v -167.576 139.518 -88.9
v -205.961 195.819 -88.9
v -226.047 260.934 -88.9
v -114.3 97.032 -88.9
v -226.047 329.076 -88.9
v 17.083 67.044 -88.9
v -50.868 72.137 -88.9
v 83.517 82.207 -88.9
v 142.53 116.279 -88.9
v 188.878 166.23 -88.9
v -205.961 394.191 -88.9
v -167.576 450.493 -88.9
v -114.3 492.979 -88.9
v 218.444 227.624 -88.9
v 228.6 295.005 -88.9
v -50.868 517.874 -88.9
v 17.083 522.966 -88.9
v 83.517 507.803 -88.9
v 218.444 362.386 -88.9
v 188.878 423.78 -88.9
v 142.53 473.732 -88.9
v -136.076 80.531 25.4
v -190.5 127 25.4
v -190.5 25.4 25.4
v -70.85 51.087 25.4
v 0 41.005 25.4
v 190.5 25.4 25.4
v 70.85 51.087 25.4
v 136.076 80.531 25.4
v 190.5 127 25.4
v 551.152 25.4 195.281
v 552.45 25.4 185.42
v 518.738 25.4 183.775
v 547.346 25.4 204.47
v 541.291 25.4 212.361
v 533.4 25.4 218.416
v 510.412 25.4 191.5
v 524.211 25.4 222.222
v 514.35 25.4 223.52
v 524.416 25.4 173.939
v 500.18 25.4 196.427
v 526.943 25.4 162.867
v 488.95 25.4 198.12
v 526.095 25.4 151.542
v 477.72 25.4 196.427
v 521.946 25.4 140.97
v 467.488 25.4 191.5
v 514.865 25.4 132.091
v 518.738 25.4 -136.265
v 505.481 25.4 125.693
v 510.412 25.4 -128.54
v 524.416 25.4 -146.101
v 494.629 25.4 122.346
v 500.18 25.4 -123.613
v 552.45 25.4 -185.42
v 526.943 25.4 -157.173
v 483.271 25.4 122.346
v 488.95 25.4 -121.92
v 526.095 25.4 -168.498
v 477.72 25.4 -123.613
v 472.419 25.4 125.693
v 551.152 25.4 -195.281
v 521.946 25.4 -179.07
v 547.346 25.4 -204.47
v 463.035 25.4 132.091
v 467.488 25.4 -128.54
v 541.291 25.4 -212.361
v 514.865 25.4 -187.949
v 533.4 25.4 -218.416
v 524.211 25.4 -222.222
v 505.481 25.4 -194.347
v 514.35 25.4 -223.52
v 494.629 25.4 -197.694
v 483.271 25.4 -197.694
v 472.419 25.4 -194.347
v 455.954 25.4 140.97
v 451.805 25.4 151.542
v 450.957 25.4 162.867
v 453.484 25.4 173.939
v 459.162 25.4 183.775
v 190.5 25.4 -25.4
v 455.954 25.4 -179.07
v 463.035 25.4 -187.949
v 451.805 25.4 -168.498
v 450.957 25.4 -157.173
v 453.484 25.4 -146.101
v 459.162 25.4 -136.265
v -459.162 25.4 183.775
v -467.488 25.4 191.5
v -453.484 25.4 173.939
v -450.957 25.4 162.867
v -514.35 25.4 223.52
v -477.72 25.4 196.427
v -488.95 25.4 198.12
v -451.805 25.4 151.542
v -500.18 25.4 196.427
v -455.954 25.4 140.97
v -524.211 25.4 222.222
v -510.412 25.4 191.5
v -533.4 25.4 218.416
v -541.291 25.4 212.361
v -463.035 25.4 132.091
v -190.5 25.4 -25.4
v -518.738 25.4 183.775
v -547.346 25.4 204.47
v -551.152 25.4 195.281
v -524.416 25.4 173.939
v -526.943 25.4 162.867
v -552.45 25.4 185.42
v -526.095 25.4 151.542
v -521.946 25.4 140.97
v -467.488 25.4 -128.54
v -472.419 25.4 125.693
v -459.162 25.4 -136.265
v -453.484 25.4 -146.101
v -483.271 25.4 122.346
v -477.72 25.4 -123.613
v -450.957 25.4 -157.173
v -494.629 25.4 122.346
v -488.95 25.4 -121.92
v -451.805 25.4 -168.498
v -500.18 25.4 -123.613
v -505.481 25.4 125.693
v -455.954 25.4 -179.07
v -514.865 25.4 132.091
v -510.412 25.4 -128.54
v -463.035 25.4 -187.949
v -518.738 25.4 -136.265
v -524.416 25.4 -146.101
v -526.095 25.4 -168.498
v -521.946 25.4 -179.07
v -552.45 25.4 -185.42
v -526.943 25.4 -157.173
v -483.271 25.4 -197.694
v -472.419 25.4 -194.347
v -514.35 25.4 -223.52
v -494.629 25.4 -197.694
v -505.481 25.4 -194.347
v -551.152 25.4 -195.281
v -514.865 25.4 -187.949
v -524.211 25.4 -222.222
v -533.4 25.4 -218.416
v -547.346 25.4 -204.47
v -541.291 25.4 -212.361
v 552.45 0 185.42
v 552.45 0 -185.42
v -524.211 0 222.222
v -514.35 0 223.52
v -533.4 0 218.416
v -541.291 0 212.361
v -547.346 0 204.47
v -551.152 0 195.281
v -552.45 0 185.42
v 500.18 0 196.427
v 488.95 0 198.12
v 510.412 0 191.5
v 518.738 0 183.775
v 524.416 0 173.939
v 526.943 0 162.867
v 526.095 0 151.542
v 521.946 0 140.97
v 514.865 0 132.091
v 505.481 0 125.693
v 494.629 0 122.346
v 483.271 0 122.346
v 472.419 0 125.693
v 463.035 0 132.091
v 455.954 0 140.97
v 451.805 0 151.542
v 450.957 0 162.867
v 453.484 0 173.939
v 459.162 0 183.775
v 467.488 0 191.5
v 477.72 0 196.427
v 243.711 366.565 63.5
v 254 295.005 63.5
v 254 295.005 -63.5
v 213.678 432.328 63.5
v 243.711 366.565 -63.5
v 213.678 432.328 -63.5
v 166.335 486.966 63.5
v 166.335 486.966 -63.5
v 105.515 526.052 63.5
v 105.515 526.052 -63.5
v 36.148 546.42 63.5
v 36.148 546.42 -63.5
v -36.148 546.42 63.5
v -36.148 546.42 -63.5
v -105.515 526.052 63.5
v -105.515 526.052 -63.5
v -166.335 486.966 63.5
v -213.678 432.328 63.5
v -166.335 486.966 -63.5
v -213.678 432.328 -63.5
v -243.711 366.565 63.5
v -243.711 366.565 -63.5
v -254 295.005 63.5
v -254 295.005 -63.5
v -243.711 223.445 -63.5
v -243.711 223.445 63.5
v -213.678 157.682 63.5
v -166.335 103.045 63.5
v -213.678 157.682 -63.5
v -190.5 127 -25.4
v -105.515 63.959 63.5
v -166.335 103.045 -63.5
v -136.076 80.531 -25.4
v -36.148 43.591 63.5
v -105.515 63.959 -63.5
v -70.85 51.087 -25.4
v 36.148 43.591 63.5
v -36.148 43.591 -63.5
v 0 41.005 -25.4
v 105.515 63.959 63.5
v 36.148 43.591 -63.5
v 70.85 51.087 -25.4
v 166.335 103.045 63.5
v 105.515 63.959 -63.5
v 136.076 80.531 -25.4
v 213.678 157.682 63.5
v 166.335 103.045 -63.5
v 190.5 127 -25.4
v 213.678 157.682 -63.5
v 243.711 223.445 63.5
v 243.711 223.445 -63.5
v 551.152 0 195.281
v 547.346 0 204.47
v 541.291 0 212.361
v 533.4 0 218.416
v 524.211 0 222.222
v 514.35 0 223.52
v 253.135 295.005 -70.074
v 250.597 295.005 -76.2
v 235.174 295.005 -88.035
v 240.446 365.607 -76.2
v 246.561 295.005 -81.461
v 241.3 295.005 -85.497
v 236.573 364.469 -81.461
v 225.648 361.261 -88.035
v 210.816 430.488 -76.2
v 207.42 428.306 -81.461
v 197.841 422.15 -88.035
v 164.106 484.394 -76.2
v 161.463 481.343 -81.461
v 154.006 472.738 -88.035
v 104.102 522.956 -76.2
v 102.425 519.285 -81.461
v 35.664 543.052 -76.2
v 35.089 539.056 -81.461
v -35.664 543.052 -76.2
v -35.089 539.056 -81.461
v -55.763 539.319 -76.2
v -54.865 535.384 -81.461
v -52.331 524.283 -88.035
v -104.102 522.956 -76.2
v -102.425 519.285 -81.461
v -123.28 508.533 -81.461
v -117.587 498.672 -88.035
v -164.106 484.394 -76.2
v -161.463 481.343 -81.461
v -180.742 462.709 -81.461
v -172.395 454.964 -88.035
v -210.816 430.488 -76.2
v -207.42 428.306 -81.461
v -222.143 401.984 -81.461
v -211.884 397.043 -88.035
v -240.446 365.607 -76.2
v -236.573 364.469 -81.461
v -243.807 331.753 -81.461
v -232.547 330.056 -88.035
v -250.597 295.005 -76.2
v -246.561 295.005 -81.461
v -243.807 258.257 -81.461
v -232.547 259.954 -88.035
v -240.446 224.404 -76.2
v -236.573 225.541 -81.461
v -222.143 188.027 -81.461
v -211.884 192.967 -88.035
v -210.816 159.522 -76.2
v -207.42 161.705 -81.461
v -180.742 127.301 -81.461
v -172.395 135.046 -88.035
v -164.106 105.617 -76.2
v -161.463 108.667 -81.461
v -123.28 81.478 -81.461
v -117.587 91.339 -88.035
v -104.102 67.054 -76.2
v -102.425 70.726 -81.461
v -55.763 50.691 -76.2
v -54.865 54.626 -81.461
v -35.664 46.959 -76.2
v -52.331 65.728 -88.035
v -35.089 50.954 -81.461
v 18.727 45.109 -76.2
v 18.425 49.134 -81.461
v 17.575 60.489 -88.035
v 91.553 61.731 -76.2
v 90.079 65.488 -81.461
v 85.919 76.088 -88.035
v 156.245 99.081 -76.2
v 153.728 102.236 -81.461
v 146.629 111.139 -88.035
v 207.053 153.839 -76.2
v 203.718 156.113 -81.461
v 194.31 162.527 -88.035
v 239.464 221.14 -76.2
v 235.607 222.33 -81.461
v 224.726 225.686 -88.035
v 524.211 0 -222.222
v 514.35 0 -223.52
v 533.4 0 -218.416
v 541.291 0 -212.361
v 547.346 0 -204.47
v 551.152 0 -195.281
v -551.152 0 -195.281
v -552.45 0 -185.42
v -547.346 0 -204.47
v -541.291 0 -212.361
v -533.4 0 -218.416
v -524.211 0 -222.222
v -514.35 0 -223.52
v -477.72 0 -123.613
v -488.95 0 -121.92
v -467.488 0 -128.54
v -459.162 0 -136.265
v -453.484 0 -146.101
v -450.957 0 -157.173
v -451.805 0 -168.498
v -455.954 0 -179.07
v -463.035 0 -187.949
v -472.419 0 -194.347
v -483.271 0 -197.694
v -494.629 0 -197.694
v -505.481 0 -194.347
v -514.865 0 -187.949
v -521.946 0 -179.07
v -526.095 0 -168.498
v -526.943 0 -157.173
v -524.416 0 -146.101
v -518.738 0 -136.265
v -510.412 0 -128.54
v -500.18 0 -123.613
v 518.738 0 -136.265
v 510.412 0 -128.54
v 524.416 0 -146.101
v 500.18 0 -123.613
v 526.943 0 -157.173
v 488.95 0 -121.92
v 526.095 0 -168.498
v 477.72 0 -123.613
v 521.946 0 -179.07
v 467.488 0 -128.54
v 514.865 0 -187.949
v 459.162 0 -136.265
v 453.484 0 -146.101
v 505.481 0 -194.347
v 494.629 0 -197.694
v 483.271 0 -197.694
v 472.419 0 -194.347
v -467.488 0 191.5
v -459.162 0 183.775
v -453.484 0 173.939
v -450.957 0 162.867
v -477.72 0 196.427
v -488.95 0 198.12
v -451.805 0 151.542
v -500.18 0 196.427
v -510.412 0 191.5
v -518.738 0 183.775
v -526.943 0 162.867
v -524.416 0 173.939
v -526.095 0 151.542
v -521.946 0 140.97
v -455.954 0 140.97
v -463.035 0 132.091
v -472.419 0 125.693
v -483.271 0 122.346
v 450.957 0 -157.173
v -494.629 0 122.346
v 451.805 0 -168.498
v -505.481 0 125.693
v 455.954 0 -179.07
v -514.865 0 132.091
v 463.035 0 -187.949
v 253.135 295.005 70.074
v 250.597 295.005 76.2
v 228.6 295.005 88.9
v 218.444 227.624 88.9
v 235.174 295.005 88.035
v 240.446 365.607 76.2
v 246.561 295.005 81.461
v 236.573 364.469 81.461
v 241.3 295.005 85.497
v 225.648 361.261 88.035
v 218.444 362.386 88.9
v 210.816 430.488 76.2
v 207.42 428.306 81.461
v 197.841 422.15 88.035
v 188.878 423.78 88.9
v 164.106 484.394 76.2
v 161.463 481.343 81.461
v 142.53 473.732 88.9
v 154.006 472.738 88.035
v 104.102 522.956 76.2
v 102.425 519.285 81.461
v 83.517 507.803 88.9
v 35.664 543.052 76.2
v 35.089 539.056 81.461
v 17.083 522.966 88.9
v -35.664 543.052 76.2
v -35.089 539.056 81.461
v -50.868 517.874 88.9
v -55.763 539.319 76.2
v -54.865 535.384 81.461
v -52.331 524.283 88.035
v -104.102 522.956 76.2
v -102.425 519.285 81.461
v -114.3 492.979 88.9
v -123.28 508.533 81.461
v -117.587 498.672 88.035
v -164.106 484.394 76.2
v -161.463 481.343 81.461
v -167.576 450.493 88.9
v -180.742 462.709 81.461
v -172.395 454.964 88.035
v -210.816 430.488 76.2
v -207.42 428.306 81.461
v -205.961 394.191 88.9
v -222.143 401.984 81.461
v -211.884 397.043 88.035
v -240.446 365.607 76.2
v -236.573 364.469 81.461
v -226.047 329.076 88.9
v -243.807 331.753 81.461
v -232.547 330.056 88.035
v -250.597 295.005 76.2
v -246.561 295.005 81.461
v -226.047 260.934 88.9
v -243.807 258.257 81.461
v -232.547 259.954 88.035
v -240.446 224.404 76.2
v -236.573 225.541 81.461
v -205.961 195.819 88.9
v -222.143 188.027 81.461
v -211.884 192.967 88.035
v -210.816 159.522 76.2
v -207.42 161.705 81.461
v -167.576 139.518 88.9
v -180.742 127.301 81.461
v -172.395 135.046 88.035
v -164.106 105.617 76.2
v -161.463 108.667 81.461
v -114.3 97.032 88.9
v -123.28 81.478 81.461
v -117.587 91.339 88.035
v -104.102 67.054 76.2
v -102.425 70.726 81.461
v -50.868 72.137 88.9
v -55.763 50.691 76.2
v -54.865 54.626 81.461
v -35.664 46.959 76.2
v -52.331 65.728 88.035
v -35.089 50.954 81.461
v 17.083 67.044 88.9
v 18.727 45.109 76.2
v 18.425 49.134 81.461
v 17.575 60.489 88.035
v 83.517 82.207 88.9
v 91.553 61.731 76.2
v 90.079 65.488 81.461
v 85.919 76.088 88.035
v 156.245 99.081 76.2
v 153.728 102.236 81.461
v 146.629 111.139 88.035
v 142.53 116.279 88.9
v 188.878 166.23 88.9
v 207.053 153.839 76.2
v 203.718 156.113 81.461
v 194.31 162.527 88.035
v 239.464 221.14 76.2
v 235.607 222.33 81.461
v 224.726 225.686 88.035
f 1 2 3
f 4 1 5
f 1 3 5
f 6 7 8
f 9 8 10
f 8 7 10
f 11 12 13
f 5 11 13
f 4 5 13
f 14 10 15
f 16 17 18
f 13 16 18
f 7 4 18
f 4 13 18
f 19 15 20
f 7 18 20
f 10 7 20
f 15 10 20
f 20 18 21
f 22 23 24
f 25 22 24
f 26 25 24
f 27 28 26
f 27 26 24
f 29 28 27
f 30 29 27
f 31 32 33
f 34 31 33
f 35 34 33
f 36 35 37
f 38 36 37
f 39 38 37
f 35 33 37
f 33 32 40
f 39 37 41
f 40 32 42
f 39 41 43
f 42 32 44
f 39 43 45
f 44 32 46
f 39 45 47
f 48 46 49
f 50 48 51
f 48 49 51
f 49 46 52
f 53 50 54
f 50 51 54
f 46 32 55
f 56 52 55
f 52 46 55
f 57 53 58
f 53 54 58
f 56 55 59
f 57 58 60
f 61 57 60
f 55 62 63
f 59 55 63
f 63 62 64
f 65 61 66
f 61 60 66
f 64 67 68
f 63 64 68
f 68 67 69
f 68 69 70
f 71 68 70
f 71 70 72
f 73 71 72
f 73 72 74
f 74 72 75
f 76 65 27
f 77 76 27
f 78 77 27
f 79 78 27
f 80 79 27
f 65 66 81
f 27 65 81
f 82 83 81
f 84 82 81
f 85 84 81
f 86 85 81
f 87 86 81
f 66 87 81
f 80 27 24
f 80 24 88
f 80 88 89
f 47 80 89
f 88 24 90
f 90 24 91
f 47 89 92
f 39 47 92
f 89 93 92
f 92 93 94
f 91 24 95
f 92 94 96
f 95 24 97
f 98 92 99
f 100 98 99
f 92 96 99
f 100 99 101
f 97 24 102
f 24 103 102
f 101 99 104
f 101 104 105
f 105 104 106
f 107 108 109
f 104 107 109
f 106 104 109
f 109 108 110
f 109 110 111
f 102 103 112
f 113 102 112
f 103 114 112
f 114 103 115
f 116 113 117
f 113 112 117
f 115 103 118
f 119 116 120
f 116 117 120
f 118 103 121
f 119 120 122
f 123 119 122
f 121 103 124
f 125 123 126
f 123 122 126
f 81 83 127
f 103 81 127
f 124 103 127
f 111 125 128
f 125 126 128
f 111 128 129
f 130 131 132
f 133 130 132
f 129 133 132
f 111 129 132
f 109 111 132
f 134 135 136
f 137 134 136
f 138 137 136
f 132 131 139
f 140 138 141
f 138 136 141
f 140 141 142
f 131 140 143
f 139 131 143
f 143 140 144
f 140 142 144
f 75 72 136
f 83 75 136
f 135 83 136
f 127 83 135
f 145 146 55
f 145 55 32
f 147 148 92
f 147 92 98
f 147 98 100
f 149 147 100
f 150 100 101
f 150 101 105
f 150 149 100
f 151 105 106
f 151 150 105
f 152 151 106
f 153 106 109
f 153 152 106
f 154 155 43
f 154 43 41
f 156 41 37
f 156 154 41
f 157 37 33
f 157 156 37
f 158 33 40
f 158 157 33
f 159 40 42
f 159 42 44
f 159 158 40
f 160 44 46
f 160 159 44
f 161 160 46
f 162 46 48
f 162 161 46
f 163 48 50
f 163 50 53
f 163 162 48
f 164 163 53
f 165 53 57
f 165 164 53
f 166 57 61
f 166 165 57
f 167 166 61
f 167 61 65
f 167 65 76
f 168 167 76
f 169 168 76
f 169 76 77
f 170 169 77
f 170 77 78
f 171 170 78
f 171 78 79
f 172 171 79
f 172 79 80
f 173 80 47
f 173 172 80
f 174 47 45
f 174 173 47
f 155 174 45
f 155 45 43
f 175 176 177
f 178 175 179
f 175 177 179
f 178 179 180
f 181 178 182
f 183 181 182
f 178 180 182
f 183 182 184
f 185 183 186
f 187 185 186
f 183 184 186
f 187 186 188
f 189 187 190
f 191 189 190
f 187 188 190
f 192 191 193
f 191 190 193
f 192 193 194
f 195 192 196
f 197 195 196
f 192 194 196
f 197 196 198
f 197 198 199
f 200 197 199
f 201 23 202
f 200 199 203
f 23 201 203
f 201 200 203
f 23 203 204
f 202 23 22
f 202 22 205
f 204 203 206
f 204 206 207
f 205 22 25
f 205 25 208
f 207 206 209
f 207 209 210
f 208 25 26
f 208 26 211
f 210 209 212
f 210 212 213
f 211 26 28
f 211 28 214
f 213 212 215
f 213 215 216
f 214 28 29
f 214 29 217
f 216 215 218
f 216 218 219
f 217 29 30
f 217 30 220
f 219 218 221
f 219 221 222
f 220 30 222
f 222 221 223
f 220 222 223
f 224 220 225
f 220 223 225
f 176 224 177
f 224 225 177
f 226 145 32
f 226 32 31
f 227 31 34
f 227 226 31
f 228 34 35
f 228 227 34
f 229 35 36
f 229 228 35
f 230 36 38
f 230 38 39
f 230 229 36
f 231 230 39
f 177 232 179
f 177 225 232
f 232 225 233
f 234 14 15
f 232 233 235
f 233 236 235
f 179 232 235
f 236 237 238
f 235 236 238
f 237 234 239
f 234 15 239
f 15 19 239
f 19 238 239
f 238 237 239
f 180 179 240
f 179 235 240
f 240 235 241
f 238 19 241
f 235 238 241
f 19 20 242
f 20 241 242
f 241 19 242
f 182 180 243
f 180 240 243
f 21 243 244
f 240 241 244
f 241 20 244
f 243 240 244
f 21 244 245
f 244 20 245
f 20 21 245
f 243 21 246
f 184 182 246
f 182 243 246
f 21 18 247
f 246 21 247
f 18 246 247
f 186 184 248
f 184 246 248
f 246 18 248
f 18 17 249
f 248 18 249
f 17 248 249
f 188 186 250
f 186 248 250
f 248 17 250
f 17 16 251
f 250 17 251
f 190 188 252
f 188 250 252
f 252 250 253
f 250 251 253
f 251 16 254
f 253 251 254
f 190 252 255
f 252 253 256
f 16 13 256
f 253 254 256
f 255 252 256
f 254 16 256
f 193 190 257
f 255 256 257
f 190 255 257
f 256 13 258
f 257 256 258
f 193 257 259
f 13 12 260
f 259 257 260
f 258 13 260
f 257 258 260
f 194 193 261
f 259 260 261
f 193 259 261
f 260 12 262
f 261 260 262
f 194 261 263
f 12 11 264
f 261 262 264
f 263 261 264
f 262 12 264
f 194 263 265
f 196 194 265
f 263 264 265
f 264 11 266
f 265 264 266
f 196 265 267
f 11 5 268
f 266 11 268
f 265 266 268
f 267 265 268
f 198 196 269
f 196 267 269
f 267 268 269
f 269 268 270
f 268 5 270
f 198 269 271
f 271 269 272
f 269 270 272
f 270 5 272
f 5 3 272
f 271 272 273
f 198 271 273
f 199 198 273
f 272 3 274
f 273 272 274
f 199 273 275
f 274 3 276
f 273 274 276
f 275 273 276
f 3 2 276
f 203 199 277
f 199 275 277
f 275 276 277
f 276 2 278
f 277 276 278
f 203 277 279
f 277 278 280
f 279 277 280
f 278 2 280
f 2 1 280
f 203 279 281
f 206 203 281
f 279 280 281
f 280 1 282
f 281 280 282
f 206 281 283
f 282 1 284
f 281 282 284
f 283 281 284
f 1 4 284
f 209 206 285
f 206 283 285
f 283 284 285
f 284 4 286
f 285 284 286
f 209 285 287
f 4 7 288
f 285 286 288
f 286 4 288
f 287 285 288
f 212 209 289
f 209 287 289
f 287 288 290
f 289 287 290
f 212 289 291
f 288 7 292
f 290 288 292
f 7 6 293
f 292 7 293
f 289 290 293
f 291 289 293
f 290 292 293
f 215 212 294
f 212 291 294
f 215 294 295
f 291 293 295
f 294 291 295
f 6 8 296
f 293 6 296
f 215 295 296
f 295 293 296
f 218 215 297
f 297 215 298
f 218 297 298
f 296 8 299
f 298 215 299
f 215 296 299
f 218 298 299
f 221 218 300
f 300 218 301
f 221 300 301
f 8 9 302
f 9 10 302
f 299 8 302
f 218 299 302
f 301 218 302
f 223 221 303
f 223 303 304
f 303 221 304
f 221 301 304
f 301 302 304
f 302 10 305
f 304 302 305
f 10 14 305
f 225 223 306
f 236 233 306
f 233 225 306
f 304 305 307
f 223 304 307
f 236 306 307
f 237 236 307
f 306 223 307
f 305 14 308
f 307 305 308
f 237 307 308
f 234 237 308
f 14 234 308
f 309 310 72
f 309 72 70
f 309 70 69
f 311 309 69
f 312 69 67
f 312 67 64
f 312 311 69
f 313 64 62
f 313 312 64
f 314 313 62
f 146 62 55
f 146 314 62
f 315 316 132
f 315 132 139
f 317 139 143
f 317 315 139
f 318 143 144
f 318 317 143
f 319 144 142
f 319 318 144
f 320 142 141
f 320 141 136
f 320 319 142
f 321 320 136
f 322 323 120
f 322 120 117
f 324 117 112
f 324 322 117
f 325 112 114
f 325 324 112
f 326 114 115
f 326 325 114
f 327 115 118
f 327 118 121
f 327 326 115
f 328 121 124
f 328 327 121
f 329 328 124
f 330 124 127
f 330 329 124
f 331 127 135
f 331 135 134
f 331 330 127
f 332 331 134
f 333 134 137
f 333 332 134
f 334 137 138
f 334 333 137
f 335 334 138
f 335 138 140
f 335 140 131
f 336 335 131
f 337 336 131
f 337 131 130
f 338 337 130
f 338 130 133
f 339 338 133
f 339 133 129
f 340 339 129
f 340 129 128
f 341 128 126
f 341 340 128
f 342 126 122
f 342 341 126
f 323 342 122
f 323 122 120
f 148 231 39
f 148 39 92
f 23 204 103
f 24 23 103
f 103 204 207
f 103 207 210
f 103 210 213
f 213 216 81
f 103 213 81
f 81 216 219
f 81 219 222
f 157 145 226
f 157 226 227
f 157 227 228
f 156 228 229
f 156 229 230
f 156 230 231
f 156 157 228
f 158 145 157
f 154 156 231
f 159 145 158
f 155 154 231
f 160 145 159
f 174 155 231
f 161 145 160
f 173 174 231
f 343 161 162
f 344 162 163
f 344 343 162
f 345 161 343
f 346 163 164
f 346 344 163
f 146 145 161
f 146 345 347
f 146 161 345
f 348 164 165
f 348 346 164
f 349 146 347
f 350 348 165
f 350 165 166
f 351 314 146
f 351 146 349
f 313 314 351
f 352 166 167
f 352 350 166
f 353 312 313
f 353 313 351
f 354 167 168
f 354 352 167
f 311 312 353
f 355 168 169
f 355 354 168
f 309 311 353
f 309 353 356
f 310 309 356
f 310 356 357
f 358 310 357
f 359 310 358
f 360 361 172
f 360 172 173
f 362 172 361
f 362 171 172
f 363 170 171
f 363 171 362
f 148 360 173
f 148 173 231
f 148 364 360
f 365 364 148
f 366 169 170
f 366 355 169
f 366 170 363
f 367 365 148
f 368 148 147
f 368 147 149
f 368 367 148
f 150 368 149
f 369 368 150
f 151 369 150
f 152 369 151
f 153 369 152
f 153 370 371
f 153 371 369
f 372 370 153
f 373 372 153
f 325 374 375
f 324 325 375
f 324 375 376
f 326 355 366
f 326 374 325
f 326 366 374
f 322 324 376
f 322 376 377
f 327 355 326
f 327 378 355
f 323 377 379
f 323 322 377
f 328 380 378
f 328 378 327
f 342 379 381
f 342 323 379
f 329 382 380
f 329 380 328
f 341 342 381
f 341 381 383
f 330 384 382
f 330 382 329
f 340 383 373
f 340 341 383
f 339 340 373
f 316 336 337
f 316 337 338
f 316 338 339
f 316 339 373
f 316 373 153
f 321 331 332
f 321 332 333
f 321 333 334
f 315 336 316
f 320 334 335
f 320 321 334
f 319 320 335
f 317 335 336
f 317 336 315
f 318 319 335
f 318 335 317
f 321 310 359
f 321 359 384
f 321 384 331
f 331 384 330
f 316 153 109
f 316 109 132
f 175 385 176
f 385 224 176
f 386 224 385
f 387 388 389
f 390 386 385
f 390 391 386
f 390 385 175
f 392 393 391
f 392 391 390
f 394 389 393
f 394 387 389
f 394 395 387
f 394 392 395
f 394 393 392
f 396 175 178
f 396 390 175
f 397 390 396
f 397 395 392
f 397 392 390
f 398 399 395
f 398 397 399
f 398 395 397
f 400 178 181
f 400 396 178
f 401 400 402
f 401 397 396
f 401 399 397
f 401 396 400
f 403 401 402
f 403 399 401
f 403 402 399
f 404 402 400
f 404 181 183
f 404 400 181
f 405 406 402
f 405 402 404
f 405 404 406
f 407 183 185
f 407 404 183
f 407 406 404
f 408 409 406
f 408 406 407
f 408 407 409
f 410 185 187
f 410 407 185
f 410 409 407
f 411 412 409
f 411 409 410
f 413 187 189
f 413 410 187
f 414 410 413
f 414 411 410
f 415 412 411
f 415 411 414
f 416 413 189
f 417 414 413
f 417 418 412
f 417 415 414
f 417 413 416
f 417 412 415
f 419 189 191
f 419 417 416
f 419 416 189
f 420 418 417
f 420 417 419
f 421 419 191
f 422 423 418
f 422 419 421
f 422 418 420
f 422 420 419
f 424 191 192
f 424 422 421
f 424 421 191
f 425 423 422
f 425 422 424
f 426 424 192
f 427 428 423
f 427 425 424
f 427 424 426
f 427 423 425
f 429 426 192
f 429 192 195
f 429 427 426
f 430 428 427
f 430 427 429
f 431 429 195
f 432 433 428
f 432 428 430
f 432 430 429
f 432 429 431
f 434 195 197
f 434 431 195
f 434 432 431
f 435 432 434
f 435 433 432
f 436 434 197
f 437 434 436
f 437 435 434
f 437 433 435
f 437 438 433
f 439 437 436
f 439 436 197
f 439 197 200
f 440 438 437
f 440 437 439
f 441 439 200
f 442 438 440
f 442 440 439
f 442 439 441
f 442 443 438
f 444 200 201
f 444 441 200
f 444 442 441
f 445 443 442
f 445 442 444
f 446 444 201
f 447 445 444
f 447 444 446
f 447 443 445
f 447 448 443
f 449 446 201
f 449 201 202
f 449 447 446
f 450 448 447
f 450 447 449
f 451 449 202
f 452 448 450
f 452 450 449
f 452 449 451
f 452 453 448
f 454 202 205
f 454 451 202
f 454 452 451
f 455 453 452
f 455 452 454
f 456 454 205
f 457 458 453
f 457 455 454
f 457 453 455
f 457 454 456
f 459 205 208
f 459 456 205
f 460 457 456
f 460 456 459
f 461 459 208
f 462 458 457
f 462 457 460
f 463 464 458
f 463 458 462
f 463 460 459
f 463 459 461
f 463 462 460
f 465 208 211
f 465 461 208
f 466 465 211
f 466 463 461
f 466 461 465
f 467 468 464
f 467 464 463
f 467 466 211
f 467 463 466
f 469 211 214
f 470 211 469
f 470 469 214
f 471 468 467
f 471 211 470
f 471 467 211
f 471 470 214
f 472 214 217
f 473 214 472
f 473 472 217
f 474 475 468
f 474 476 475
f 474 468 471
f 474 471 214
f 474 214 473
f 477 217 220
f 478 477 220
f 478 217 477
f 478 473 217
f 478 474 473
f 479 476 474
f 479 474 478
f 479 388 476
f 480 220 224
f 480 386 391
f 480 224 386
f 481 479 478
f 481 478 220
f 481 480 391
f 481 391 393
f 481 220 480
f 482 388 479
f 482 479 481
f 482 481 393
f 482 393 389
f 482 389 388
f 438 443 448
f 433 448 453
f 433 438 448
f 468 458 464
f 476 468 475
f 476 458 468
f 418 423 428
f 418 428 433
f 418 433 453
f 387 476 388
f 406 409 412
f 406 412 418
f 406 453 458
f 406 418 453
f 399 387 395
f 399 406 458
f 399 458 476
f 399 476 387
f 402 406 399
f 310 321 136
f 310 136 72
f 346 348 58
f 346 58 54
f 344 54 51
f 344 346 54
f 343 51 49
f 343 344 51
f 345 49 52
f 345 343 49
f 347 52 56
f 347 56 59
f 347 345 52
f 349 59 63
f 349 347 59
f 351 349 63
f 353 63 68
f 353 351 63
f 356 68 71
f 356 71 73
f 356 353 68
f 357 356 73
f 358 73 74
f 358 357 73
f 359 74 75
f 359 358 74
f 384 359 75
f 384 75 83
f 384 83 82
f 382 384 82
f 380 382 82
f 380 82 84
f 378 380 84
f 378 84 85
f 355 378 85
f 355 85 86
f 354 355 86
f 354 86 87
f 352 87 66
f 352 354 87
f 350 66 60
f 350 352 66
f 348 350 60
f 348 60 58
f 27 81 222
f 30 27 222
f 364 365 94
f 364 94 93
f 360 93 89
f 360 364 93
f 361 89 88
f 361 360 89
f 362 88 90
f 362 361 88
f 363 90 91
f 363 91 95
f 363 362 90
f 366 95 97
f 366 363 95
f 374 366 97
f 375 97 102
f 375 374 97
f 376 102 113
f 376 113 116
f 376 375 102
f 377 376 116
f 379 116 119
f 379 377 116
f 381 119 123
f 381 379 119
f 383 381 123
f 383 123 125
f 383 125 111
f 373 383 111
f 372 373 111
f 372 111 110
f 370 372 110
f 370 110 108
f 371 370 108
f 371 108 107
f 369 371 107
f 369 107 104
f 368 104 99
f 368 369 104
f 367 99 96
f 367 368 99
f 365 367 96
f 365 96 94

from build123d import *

# Parameters (mm, degrees)
SKETCH1_R                = 38.1
BOSS_EXTRUDE1_DEPTH      = 25.4
BOSS_EXTRUDE2_DEPTH      = 25.4
BOSS_EXTRUDE2_DEPTH_BACK = 25.4
BOSS_EXTRUDE3_DEPTH      = 88.9
BOSS_EXTRUDE3_DEPTH_BACK = 88.9
SKETCH4_R                = 254
FILLET1_R                = 25.4


with BuildPart() as part:
    # Sketch1 → Boss-Extrude1 (new body)
    with BuildSketch(Plane(origin=(0, 0, 0), x_dir=(1, 0, 0), z_dir=(0, 1, 0))):
        with BuildLine():
            Line((-514.35, 223.52), (514.35, 223.52))
            ThreePointArc((514.35, 223.52), (541.290768363, 212.360768363), (552.45, 185.42))
            Line((552.45, 185.42), (552.45, -185.42))
            ThreePointArc((552.45, -185.42), (541.290768363, -212.360768363), (514.35, -223.52))
            Line((514.35, -223.52), (-514.35, -223.52))
            ThreePointArc((-514.35, -223.52), (-541.290768363, -212.360768363), (-552.45, -185.42))
            Line((-552.45, -185.42), (-552.45, 185.42))
            ThreePointArc((-552.45, 185.42), (-541.290768363, 212.360768363), (-514.35, 223.52))
        make_face()
        with Locations(Location((-488.95, 160.02, 0), (0, 0, 270))):
            Circle(SKETCH1_R, mode=Mode.SUBTRACT)
        with Locations(Location((488.95, 160.02, 0), (0, 0, 270))):
            Circle(SKETCH1_R, mode=Mode.SUBTRACT)
        with Locations(Location((488.95, -160.02, 0), (0, 0, 270))):
            Circle(SKETCH1_R, mode=Mode.SUBTRACT)
        with Locations(Location((-488.95, -160.02, 0), (0, 0, 270))):
            Circle(SKETCH1_R, mode=Mode.SUBTRACT)
    extrude(amount=BOSS_EXTRUDE1_DEPTH)

    # Sketch3 → Boss-Extrude2 (add, two sides: drawn at the far end of the back side and taken through both)
    with BuildSketch(Plane.XY.offset(-BOSS_EXTRUDE2_DEPTH_BACK)):
        with BuildLine():
            Line((-190.5, 25.4), (190.5, 25.4))
            Line((190.5, 25.4), (190.5, 127))
            ThreePointArc((190.5, 127), (0, 41.005208253), (-190.5, 127))
            Line((-190.5, 127), (-190.5, 25.4))
        make_face()
    extrude(amount=BOSS_EXTRUDE2_DEPTH + BOSS_EXTRUDE2_DEPTH_BACK)

    # Sketch4 → Boss-Extrude3 (add, two sides: drawn at the far end of the back side and taken through both)
    with BuildSketch(Plane.XY.offset(-BOSS_EXTRUDE3_DEPTH_BACK)):
        with Locations((0, 295.005208253)):
            Circle(SKETCH4_R)
    extrude(amount=BOSS_EXTRUDE3_DEPTH + BOSS_EXTRUDE3_DEPTH_BACK)

    # Fillet1
    fillet1_edges = [part.edges().sort_by_distance(p)[0] for p in [
        (-254, 295.005208253, -88.9),
        (-254, 295.005208253, 88.9),
    ]]
    fillet(fillet1_edges, radius=FILLET1_R)


solid = part.part
